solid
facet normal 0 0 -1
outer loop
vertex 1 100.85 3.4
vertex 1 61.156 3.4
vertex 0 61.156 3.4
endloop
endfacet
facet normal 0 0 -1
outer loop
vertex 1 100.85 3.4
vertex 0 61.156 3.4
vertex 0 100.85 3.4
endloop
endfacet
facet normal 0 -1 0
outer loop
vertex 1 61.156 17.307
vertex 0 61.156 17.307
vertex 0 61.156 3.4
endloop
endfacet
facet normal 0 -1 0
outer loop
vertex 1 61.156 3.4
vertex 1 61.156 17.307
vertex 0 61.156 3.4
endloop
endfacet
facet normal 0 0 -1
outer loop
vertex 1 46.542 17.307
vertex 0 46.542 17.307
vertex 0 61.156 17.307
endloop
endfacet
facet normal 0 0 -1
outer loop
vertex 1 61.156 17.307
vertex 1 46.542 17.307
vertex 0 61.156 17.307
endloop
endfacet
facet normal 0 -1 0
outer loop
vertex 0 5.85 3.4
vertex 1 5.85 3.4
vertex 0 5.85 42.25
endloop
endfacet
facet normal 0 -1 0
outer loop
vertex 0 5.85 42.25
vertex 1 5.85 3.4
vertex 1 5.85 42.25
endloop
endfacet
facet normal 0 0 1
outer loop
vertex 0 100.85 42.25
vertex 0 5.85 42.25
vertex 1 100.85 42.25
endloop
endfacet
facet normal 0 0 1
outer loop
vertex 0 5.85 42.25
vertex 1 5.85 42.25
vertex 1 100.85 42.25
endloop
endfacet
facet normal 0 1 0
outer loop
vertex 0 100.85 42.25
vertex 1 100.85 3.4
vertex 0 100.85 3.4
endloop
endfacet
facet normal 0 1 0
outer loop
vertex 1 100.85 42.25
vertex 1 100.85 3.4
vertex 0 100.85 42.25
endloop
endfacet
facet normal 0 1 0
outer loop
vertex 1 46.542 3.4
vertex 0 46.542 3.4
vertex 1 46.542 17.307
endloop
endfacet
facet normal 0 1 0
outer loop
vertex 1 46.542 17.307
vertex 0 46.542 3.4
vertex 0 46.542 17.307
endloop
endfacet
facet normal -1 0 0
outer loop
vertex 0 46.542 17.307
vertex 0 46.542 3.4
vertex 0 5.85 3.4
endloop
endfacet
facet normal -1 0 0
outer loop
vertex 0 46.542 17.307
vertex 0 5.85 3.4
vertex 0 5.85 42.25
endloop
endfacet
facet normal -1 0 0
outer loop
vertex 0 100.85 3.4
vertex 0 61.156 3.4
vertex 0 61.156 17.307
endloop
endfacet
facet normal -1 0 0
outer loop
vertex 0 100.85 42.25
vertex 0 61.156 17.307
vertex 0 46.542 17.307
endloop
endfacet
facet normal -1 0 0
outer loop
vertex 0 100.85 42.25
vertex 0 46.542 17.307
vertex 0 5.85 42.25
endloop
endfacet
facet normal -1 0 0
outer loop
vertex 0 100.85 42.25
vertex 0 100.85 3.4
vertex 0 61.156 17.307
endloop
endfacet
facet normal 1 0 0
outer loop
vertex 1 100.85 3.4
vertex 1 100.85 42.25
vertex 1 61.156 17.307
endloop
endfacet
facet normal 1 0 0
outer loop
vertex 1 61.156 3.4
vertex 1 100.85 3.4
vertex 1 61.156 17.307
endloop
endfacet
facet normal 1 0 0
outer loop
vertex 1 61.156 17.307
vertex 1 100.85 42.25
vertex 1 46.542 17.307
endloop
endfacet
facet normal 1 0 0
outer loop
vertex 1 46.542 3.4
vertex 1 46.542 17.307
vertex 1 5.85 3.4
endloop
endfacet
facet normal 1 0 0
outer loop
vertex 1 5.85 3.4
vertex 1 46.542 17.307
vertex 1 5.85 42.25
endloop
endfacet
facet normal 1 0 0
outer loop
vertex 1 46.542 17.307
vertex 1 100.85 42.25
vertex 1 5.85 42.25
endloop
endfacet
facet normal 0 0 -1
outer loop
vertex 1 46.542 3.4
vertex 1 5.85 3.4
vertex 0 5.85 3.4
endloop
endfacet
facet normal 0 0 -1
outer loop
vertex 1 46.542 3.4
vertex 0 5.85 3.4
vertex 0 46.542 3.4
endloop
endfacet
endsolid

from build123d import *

# Parameters (mm, degrees)
SKETCH_1_W          = 95
SKETCH_1_H          = 38.85
EXTRUDE_1_DEPTH     = 0.5
SKETCH_2_W          = 38.85
SKETCH_2_H          = 95
EXTRUDE_2_DEPTH     = 0.5
CUT_EXTRUDE_1_DEPTH = 110.347085009


with BuildPart() as part:
    # Эскиз1 → Бобышка-Вытянуть1 (new body)
    with BuildSketch(Plane(origin=(0.5, 0, 0), x_dir=(0, -1, 0), z_dir=(-1, 0, 0))):
        with Locations((-53.35, 22.825)):
            Rectangle(SKETCH_1_W, SKETCH_1_H)
    extrude(amount=-EXTRUDE_1_DEPTH)

    # Эскиз2 → Бобышка-Вытянуть2 (add)
    with BuildSketch(Plane.ZY.offset(-0.5)):
        with Locations((22.825, 53.35)):
            Rectangle(SKETCH_2_W, SKETCH_2_H)
    extrude(amount=EXTRUDE_2_DEPTH)

    # Эскиз3 → Вырез-Вытянуть1 (cut, through all)
    with BuildSketch(Plane.ZY):
        Polygon((-5.326732783, 46.541852111), (17.306560977, 46.5418531), (17.306560338, 61.155899742), (-5.326732783, 61.155898752), align=None)
    extrude(amount=-CUT_EXTRUDE_1_DEPTH, mode=Mode.SUBTRACT)


solid = part.part
